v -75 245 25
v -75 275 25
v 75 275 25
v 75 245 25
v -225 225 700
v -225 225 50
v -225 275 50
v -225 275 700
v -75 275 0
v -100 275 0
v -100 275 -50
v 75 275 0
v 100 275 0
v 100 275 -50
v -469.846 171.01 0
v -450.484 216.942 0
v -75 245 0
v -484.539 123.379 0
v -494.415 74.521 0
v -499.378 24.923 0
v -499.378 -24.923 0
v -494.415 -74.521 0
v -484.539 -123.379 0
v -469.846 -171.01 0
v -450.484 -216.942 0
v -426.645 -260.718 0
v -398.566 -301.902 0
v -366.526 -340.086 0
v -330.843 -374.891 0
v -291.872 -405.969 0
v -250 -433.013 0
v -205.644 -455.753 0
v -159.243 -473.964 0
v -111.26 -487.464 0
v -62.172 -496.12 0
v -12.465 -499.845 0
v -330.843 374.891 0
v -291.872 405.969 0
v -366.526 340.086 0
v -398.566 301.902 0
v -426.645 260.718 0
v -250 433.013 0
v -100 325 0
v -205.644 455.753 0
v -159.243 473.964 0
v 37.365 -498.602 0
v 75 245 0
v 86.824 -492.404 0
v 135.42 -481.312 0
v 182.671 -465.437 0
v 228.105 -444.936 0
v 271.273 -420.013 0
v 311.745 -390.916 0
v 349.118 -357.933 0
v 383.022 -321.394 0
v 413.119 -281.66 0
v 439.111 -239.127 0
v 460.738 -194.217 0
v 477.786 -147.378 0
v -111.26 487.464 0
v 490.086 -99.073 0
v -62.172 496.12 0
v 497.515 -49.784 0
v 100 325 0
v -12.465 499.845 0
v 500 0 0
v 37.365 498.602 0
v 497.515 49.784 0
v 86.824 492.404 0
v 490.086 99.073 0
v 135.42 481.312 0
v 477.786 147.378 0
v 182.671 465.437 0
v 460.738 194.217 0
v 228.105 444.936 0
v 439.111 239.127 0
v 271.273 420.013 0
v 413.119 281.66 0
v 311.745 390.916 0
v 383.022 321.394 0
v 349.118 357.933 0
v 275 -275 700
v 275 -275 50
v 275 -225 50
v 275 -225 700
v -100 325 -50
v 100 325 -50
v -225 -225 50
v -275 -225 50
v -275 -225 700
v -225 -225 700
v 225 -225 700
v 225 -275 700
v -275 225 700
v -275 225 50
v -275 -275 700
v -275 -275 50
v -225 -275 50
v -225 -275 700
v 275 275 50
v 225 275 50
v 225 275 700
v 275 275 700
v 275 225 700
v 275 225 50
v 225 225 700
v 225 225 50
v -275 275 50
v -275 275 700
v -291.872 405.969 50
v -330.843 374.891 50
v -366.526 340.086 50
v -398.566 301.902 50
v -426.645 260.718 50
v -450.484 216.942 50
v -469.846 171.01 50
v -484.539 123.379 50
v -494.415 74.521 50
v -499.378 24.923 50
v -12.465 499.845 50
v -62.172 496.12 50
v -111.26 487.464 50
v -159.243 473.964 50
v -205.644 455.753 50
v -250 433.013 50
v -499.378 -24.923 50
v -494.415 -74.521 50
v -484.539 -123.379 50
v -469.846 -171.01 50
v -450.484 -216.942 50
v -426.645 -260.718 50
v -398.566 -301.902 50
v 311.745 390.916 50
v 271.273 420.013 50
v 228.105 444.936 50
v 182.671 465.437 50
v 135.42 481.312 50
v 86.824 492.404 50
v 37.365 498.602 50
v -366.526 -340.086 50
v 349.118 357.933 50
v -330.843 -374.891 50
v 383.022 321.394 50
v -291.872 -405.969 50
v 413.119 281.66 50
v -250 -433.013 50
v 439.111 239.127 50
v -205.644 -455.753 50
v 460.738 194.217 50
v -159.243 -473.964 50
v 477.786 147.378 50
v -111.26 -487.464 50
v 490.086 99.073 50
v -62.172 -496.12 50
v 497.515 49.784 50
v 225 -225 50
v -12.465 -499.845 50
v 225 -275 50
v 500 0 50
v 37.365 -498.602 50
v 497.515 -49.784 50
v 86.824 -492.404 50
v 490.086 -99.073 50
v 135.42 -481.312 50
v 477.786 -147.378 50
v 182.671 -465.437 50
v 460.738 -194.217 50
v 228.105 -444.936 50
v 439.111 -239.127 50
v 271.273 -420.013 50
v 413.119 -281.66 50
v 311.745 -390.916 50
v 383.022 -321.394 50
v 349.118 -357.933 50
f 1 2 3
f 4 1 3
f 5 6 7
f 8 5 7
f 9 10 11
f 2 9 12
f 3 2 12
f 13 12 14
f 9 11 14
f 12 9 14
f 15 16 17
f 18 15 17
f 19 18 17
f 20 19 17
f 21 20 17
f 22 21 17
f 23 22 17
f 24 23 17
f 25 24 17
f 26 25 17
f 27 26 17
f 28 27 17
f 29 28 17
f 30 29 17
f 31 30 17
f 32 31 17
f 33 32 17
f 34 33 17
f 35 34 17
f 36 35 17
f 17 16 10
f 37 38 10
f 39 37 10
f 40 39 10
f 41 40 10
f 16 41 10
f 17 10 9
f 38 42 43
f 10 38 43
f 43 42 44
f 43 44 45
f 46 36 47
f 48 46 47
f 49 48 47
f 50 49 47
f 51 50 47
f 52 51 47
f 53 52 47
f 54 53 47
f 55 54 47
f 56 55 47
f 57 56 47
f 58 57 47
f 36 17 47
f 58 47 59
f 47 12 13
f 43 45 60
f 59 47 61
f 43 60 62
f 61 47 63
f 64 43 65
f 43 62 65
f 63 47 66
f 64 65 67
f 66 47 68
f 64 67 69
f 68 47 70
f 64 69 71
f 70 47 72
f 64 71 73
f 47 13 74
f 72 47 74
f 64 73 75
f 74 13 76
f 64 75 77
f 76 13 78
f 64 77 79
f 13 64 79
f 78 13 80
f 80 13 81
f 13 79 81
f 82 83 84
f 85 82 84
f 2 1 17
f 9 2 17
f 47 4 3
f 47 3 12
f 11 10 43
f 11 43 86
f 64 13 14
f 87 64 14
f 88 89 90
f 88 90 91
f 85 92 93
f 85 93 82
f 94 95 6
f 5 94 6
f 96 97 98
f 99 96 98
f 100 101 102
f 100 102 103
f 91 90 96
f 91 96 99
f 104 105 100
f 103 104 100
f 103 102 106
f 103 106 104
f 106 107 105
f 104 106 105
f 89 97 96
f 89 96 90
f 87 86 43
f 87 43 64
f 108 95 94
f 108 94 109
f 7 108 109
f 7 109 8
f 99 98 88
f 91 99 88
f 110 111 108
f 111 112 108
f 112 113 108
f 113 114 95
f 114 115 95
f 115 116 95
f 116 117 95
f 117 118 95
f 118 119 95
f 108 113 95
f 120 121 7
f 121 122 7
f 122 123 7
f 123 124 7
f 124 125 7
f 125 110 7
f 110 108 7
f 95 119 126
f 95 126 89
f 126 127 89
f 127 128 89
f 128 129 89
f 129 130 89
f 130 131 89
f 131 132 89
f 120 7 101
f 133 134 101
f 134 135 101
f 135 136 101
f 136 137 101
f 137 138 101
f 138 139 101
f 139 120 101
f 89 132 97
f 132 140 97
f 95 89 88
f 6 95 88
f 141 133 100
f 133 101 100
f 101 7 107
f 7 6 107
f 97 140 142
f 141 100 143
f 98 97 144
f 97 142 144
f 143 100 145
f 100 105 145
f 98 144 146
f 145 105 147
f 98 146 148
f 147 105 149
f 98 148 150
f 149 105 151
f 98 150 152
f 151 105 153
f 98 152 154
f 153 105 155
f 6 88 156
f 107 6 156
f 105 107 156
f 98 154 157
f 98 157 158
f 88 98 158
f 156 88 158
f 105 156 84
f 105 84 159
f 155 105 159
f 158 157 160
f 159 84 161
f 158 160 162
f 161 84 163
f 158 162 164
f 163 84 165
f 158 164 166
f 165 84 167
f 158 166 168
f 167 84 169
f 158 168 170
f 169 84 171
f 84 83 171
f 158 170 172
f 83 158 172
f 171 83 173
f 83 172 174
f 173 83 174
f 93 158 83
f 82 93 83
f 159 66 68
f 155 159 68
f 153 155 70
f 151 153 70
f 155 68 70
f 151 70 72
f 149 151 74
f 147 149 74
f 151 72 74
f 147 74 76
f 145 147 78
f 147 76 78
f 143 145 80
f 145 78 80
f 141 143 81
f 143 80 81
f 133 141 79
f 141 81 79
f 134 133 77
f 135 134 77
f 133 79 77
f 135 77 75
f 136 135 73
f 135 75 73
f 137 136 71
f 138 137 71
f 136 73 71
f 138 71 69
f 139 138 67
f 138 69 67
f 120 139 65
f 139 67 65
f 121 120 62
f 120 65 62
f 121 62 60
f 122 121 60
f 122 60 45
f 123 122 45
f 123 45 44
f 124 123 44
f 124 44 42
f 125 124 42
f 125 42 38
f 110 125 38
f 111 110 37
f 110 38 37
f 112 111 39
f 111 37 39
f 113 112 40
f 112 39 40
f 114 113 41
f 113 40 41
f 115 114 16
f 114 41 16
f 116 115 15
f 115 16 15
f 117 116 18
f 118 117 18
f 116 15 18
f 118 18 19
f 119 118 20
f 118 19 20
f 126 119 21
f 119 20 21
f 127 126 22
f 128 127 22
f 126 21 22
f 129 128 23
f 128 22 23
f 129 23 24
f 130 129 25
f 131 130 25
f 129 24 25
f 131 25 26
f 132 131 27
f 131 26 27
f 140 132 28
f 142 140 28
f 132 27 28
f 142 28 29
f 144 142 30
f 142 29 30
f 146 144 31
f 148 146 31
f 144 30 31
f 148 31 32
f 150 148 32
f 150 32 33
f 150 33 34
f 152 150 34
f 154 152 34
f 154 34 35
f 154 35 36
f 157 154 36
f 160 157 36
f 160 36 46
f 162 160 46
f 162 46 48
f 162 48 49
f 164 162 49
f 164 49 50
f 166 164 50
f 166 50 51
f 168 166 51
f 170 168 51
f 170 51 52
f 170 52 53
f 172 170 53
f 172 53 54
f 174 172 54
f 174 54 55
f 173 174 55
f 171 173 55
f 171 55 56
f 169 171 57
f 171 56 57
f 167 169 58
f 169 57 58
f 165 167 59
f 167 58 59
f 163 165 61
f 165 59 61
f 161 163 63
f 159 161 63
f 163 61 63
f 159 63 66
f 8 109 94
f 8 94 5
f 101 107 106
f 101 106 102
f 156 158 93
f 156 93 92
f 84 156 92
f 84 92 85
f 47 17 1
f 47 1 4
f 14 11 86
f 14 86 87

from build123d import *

# Parameters (mm, degrees)
SKETCH_1_R          = 500
EXTRUDE_1_DEPTH     = 50
SKETCH_2_W          = 50
SKETCH_2_H          = 50
EXTRUDE_2_DEPTH     = 700
SKETCH_3_W          = 50
SKETCH_3_H          = 50
EXTRUDE_3_DEPTH     = 700
SKETCH_4_W          = 50
SKETCH_4_H          = 50
EXTRUDE_4_DEPTH     = 700
SKETCH_5_W          = 50
SKETCH_5_H          = 50
EXTRUDE_5_DEPTH     = 700
SKETCH_6_W          = 200
SKETCH_6_H          = 100
EXTRUDE_6_DEPTH     = 50
SKETCH_7_W          = 150
SKETCH_7_H          = 50
CUT_EXTRUDE_1_DEPTH = 30


with BuildPart() as part:
    # 草图1 → 凸台-拉伸1 (new body)
    with BuildSketch(Plane.XY):
        Circle(SKETCH_1_R)
    extrude(amount=EXTRUDE_1_DEPTH)

    # 草图2 → 凸台-拉伸2 (add)
    with BuildSketch(Plane.XY):
        with Locations((250, 250)):
            Rectangle(SKETCH_2_W, SKETCH_2_H)
    extrude(amount=EXTRUDE_2_DEPTH)

    # 草图3 → 凸台-拉伸3 (add)
    with BuildSketch(Plane.XY):
        with Locations((-250, 250)):
            Rectangle(SKETCH_3_W, SKETCH_3_H)
    extrude(amount=EXTRUDE_3_DEPTH)

    # 草图4 → 凸台-拉伸4 (add)
    with BuildSketch(Plane.XY):
        with Locations((250, -250)):
            Rectangle(SKETCH_4_W, SKETCH_4_H)
    extrude(amount=EXTRUDE_4_DEPTH)

    # 草图5 → 凸台-拉伸5 (add)
    with BuildSketch(Plane.XY):
        with Locations((-250, -250)):
            Rectangle(SKETCH_5_W, SKETCH_5_H)
    extrude(amount=EXTRUDE_5_DEPTH)

    # 草图6 → 凸台-拉伸6 (add)
    with BuildSketch(Plane(origin=(0, 275, 0), x_dir=(1, 0, 0), z_dir=(0, 1, 0))):
        Rectangle(SKETCH_6_W, SKETCH_6_H)
    extrude(amount=EXTRUDE_6_DEPTH)

    # 草图7 → 切除-拉伸1 (cut)
    with BuildSketch(Plane(origin=(0, 275, 0), x_dir=(1, 0, 0), z_dir=(0, 1, 0))):
        Rectangle(SKETCH_7_W, SKETCH_7_H)
    extrude(amount=-CUT_EXTRUDE_1_DEPTH, mode=Mode.SUBTRACT)


solid = part.part
